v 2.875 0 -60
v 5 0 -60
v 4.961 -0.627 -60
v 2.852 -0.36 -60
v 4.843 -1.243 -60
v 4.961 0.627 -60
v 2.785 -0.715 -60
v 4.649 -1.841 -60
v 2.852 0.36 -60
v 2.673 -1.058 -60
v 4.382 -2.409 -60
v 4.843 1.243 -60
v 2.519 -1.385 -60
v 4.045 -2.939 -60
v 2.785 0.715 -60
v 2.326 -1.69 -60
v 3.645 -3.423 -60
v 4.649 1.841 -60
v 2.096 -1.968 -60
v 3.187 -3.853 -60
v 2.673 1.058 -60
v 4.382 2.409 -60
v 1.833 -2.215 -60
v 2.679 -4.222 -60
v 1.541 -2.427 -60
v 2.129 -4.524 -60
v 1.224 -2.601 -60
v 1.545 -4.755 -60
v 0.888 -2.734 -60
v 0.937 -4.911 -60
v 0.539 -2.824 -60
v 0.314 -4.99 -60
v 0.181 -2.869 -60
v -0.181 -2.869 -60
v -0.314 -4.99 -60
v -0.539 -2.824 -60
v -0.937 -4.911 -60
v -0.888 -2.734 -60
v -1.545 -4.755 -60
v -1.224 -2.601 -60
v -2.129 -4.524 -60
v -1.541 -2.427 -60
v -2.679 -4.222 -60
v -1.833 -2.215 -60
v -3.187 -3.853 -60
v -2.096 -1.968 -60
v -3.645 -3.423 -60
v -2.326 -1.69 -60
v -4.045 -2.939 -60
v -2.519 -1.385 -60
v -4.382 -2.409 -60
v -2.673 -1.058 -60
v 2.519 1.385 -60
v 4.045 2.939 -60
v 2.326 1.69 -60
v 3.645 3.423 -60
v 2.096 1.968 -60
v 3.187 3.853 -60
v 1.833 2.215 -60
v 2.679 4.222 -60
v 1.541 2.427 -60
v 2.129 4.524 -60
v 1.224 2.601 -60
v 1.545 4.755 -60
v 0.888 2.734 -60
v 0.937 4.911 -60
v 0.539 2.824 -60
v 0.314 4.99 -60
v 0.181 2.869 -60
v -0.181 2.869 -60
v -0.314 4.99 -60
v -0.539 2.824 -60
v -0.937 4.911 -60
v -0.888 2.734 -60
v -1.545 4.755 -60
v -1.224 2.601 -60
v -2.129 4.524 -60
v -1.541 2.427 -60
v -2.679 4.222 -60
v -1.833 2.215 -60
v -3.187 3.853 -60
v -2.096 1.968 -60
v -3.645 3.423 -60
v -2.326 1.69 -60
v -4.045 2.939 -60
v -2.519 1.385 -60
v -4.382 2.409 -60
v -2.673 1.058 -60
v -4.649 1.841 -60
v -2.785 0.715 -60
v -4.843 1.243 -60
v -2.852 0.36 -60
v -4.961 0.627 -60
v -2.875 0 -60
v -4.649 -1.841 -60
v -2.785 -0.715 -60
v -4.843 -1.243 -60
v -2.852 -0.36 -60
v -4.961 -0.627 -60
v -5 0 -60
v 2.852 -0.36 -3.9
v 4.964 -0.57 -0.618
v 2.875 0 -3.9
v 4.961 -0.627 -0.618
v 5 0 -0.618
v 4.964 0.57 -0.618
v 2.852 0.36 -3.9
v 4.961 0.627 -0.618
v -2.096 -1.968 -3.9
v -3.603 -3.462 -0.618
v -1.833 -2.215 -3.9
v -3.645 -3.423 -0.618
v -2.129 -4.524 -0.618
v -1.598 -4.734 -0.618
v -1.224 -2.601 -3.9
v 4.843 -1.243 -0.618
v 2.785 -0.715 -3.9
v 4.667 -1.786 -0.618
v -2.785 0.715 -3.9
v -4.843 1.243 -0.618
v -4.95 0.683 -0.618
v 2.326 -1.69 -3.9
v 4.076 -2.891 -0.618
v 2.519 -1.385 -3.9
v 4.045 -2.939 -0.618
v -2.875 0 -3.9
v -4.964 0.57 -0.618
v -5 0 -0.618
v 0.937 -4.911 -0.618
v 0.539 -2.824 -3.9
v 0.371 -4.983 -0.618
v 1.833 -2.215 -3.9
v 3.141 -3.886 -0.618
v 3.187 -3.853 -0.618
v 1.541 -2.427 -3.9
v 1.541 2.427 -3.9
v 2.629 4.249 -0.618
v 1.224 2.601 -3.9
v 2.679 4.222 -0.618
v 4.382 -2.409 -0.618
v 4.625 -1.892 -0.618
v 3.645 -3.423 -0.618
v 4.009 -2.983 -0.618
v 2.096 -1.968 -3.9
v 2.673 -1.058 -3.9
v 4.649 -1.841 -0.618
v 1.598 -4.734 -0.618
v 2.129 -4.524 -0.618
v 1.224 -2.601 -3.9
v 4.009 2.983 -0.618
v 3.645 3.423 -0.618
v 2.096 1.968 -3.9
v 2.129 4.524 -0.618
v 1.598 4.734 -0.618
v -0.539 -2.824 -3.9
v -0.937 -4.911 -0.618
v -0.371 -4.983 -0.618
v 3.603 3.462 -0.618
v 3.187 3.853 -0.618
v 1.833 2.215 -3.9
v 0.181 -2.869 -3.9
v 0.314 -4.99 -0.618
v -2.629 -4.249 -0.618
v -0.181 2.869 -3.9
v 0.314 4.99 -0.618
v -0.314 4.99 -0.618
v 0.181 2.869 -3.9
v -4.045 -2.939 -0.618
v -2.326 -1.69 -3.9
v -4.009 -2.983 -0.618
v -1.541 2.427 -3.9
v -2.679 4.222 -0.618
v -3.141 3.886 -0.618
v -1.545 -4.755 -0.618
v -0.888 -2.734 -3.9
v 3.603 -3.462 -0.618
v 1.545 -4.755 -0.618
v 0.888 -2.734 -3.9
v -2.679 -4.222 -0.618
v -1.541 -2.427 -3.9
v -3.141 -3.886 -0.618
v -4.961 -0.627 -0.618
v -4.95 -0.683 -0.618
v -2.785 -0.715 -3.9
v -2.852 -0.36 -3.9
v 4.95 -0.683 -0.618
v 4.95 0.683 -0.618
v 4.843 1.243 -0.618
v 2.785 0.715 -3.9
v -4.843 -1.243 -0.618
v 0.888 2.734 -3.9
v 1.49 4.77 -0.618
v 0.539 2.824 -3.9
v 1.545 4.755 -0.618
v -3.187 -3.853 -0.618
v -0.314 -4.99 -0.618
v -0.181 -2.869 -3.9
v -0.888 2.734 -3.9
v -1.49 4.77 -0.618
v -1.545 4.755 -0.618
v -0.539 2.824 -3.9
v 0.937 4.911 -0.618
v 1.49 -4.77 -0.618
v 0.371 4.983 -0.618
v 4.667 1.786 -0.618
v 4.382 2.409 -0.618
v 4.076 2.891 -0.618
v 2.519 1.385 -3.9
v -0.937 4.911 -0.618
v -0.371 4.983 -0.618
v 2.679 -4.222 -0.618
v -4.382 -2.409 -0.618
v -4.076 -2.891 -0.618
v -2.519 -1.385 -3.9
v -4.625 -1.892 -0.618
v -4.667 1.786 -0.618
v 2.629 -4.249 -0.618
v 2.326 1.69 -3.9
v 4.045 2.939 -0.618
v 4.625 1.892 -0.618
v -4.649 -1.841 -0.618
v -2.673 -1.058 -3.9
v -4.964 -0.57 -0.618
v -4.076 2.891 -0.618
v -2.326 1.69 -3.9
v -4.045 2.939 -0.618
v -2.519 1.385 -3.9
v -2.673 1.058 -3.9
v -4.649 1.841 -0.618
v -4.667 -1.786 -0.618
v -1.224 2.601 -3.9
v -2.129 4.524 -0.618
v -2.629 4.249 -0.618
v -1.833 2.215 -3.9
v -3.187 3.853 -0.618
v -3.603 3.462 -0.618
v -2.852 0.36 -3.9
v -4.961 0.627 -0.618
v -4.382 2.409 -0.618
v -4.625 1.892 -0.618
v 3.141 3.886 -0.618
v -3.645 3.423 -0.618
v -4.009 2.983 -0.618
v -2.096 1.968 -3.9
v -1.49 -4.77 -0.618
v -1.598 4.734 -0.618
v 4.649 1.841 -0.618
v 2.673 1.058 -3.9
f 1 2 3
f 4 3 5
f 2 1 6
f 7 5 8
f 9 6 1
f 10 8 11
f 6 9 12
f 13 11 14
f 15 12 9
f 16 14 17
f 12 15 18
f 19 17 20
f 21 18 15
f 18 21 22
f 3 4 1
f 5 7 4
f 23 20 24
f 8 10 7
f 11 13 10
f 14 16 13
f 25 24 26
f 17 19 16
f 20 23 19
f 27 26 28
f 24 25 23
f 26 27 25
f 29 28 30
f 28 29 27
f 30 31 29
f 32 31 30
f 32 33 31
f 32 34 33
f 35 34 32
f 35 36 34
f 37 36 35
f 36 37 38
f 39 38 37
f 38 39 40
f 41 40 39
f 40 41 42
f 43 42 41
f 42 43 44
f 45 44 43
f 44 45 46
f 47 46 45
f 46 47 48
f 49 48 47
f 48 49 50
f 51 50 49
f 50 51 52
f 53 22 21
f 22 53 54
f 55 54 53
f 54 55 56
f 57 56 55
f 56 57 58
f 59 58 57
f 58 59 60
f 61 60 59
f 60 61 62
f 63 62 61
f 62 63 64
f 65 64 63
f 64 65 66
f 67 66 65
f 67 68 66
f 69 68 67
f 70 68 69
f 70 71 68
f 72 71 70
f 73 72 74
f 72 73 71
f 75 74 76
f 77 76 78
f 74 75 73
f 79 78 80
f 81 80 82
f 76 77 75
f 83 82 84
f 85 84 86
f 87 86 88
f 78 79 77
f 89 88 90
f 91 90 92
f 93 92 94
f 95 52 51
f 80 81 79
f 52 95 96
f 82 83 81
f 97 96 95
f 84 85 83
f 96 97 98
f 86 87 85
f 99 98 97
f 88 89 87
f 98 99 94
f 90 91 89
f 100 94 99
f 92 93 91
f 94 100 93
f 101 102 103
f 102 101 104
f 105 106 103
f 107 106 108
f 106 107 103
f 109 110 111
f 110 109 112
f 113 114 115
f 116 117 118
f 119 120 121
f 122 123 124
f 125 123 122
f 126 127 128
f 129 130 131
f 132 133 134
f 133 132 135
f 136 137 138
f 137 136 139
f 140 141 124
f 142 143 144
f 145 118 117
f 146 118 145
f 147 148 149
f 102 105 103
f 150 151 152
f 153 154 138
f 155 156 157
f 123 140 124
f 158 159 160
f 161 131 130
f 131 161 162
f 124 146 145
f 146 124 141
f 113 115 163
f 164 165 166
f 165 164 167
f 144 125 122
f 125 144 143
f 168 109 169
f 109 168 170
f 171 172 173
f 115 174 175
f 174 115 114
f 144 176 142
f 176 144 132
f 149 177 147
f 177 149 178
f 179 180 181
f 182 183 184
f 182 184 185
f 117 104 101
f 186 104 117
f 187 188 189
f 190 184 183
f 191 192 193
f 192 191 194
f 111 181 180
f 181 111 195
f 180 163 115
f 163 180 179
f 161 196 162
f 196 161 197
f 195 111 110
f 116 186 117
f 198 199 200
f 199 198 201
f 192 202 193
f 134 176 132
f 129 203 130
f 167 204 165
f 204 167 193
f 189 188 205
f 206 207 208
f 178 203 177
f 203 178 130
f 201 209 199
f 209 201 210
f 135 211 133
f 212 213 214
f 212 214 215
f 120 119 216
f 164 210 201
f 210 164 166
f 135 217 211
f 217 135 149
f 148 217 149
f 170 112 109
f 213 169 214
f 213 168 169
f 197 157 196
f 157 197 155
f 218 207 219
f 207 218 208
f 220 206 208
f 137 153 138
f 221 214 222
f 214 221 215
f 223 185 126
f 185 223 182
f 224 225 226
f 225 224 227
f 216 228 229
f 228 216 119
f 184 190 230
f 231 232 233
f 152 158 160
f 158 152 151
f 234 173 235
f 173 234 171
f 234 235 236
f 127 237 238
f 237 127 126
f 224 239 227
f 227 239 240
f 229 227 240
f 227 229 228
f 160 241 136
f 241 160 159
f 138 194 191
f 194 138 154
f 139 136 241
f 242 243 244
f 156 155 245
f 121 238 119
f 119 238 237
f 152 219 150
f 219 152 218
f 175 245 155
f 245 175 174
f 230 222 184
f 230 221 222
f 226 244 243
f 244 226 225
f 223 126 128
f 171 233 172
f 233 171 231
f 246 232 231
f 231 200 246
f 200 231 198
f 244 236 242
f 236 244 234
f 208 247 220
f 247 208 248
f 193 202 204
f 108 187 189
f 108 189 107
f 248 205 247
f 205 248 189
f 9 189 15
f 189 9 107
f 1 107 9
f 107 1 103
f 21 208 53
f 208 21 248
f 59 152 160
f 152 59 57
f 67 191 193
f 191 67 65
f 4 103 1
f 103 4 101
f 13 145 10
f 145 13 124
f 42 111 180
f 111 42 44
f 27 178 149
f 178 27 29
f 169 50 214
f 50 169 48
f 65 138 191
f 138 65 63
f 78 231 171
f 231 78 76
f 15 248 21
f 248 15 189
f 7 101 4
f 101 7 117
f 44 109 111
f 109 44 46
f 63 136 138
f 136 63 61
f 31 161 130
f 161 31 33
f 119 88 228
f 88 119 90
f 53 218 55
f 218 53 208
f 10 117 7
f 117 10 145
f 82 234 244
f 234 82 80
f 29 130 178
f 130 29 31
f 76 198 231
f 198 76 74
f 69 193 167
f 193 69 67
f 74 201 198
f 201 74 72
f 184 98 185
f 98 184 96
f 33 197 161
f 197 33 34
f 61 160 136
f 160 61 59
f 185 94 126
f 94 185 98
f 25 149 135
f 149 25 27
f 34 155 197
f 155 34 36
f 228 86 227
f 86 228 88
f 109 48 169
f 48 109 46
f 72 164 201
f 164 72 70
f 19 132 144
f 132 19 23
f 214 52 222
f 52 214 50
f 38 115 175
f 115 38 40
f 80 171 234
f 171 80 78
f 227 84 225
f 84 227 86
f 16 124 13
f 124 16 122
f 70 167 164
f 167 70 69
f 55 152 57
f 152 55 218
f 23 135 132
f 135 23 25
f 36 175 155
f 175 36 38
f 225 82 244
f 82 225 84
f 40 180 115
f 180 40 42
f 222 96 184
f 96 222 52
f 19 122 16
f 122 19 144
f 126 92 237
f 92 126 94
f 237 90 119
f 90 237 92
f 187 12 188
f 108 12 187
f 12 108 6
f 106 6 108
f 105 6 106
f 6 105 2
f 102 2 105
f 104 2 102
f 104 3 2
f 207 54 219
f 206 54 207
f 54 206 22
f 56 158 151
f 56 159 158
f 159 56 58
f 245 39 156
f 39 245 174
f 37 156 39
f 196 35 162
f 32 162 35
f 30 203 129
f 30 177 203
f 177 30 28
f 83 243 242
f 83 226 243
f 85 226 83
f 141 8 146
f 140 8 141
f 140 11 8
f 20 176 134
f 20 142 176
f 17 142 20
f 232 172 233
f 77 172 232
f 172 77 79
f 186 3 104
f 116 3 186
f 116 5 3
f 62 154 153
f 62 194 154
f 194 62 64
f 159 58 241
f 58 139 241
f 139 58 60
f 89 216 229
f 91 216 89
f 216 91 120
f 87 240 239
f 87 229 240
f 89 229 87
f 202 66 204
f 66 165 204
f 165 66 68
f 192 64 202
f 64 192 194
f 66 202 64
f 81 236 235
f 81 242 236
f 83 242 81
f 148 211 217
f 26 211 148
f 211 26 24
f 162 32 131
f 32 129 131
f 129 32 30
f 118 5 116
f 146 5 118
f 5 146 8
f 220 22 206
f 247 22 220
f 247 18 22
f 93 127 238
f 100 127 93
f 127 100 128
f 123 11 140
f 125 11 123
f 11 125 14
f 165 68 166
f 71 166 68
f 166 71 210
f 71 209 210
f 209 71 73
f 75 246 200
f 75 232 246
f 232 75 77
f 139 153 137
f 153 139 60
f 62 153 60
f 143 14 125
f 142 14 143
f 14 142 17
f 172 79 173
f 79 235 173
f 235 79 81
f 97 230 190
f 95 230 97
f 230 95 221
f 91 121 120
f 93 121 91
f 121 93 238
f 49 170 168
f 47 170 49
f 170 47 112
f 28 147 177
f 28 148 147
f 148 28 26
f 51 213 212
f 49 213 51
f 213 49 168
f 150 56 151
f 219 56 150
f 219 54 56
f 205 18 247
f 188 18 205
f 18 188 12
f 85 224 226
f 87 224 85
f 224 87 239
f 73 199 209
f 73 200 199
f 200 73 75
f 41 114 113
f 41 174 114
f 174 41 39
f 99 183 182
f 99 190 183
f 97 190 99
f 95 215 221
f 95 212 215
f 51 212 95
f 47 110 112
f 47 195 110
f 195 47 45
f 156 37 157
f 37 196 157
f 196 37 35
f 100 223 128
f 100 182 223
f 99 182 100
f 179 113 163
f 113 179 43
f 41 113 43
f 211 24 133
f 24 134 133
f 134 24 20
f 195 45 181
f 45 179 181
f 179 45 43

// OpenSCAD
$fn = 50;


difference() {
	union() {
		translate(v = [0, 0, -60.0000000000]) {
			cylinder(h = 60, r = 5.0000000000);
		}
		cylinder(h = 0, r = 8.0000000000);
	}
	union() {
		translate(v = [0, 0, 0]) {
			rotate(a = [0, 0, 0]) {
				difference() {
					union() {
						#translate(v = [0, 0, -60.0000000000]) {
							cylinder(h = 60, r = 2.6000000000);
						}
						#translate(v = [0, 0, -3.9000000000]) {
							cylinder(h = 3.9000000000, r1 = 2.8750000000, r2 = 5.4000000000);
						}
						#translate(v = [0, 0, -60.0000000000]) {
							cylinder(h = 60, r = 2.8750000000);
						}
						#translate(v = [0, 0, -60.0000000000]) {
							cylinder(h = 60, r = 2.6000000000);
						}
					}
					union();
				}
			}
		}
	}
}
